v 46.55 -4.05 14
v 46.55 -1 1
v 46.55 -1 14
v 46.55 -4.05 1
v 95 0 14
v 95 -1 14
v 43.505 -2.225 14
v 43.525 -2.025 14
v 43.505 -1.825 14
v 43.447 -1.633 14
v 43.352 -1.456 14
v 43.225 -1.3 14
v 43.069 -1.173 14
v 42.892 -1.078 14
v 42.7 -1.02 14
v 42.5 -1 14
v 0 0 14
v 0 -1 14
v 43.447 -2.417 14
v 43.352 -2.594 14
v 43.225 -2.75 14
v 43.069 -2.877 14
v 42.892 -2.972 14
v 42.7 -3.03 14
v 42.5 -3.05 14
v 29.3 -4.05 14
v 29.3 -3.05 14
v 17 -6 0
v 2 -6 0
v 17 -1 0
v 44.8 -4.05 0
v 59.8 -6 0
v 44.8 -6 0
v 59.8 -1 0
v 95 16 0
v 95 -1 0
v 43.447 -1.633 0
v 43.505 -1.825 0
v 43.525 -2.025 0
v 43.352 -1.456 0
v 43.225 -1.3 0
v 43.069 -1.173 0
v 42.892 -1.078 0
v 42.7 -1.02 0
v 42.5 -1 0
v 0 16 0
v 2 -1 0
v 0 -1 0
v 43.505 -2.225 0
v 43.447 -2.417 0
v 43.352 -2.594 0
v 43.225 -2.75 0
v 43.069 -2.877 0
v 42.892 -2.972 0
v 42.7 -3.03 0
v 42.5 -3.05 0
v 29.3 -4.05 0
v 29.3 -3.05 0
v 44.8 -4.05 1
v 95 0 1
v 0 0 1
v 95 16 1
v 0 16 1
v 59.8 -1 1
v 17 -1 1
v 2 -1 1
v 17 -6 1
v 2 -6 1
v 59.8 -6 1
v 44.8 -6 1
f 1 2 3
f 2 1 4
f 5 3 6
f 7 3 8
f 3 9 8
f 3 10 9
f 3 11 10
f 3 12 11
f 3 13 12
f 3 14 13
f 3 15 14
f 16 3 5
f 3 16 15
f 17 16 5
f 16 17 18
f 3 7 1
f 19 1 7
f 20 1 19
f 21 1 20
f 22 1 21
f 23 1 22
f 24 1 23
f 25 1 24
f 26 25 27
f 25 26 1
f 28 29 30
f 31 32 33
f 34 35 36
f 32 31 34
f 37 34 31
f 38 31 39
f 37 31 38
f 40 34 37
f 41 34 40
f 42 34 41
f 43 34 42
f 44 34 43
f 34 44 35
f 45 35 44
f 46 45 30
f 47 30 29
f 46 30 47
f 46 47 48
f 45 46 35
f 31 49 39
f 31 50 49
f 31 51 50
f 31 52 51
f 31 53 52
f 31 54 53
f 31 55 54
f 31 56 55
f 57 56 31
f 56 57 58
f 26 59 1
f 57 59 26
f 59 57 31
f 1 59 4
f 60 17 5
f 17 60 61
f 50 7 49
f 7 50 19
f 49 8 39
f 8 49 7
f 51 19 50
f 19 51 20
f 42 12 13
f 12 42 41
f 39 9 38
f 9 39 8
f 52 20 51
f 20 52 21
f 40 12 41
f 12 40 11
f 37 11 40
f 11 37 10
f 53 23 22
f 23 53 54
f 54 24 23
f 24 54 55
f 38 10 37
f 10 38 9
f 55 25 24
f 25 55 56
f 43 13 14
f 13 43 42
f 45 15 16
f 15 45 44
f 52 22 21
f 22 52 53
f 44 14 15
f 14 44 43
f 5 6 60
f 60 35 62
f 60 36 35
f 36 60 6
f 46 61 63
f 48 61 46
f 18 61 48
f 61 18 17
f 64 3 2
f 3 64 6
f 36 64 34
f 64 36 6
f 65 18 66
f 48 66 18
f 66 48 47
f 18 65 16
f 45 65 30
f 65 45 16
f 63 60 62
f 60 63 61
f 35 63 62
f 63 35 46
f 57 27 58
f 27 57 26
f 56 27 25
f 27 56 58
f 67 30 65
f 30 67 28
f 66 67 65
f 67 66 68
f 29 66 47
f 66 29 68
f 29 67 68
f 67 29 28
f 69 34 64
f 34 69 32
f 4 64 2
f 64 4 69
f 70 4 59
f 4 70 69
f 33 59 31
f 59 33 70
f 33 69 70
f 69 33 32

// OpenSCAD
//////////////////////////////////////////////////////////////////////////////////////
///
///  FLEXBATTER: Flexing battery holder with built-in spring
///
///  This file generates battery holders for arbitrary cylindrical sizes.
///  The number of batteries and their size is fully parametrized.
///
///  The usual metallic spring at the minus pole is replaced by a
///  flexible printed spring, which is pressing the contacts firmly to 
///  the battery.
///
///  The contacts for the plus and minus pole can easily be made by
///  a few windings of the uninsulated ends of the connecting wires.
///  Each battery compartment contains are several holes to the outside
///  as well ad to the neighboring compartments, through which connecting
///  wires can be passed for easy configuring of parallel, serial or
///  balanced-serial battery packs.
///  
///  The preconfigured battery sizes are:
///  AA, AAA, C, D, 18650(Li-Ion), 18650P(protected Li-Ion), CR123A(16340)
///  
///  Given that the printed plastic spring needs to be flexible, ABS is the material
///  of choice here.
///
//////////////////////////////////////////////////////////////////////////////////////
///
///  2014-09-09 Heinz Spiess, Switzerland
///
///  released under Creative Commons - Attribution - Share Alike licence (CC BY-SA)
//////////////////////////////////////////////////////////////////////////////////////

// build a cube with chamfered edges
module chamfered_cube(size,d=1){
   hull(){
     translate([d,d,0])cube(size-2*[d,d,0]);
     translate([0,d,d])cube(size-2*[0,d,d]);
     translate([d,0,d])cube(size-2*[d,0,d]);
   }
}


// draw an arc width height h between radius r1..r2 and angles a1..a2
module arc(r1,r2,h,a1=0,a2=0){
     if(a2-a1<=180){
        difference(){
           cylinder(r=r2,h=h);
           translate([0,0,-1])cylinder(r=r1,h=h+2);
	   rotate(a2)translate([-r1-r2,0,-1])cube([2*(r1+r2),2*(r1+r2),h+2]);
	   rotate(a1+180)translate([-r1-r2,0,-1])cube([2*(r1+r2),2*(r1+r2),h+2]);
        }
     } else {
           difference(){
              cylinder(r=r2,h=h);
              translate([0,0,-1])cylinder(r=r1,h=h+2);
              intersection(){
	       rotate(a2)translate([-r1-r2,0,-1])cube([2*(r1+r2),2*(r1+r2),h+2]);
	       rotate(a1+180)translate([-r1-r2,0,-1])cube([2*(r1+r2),2*(r1+r2),h+2]);
	      }
           }
     }
}

/////////////////////////////////////////////////////////////////////////////////
// sline - generate a "snake line" of width w and height h 
// with a arbitrary sequence of segments defined by a radius and a turning angle
//
//   angle[i] > 0  left turn / counter-clockwise
//   angle[i] < 0  left turn / clockwise
//   angle[i] = 0  straight segment with length radius[i]
//
/////////////////////////////////////////////////////////////////////////////////
// Heinz Spiess, 2014-09-06 (CC BY-SA)
/////////////////////////////////////////////////////////////////////////////////
module sline(angle,radius,i,w,h){
   scale([angle[i]>=0?1:-1,1,1])
      assign(r=abs(radius[i]))assign(a=angle[i])
         translate([a?r:0,0,0]){
	    translate([-w/2,-r-0.01,0])cube([w,0.02,h]); // tiny overlap!
            if(a)arc(r-w/2,r+w/2,0,a,h=h);
	    else if(r>0)translate([-w/2,-r,0])cube([w,r,h]);
      if(i+1<len(angle))
           rotate(angle[i])
	      translate([a?-r:0,a?0:-r,0])
	         sline(angle,radius,i+1,w,h);
  }
}

//////////////////////////////////////////////////////////////////////////////////
//
//  FLEXBATTER:  Flexing battery holder with integrated plastic spring
//
//////////////////////////////////////////////////////////////////////////////////
module flexbatter(n=1,l=65,d=18,hf=0.75,r=4,shd=3,eps=0.28,el=0,xchan=[1/4,3/4],$fn=24){
ew=0.56;   // extrusion width
eh=0.25;   // extrusion height
w = 4*ew;  // case wall thickness
ws = 2*ew; // spring wall thickness
ch = w-ws; // edge chamfering
deepen=0; //deepening for side grip of batteries
//el = 0;  // extra length in spring
//eps = 0.28;
//shd = 3; // screw hole diameter
//hf=0.75;
//xchan=[1/4,3/4]; // relative position of traversal wire channels

r = d/5+2*ws; // linear spring length (depends on sline() call!)

   for(i=[0:n-1])translate([0,i*(d+w+ws),0]){ // generate n battery cases
      difference(){
         
         union(){
            difference(){
               // main body
               translate([0,-w-d/2,0])
	          chamfered_cube([l+w,d+2*w+(i<n-1?ws:0),hf*d+w+ch],ch);
	       // main cavity
               translate([-2,-d/2,w])cube([2+l,d,d+1]);
	       // cavity for locating plastic spring
               translate([-1,-d/2,-1])cube([2,d,d+w+2]);
	       // small cylindrical carving of walls and bottom
	       if(eps>0)translate([-1,0,d/2+w])rotate([0,90,0])cylinder(r=d/2+eps,h=l+1);
            }
      
            // plastic spring for minus pole
            for(sy=[-1,1])scale([1,sy,1])assign(D=d+2*w-2*ws-0.7){
               translate([ch,d/2+w-ws/2,0])rotate(-90)
		  //sline([90,0,120,90,120,90,0],[d/8+2,d/6,d/8-1,d/8,-d/8,d/8,d/2],0,ws,hf*d+w);
		  sline([0,180,0,180,0,-180,0,90,0],[r+ch+el,D/4,el,D/12,el/2,D/12,1+el/2,D/5,D/3],0,ws,hf*d+w);


            }
         }
      
         // lower and upper holes for contacts
         for(z=[-2*ws,2*ws])
            translate([-2*ws,-w,w-ws/2+d/2+z])cube([l+2*w+2,2*w,ws]);
      
         // longitudinal bottom wire channel
         translate([-2*ws,0,0])rotate([0,90,0])cylinder(r=w/2,h=l+w+2+r,$fn=5);
      
         // traversal bottom wire channels
         for(x=l*xchan)translate([x,-d/2-w-1,eh]) rotate([-90,0,0])cylinder(r=w/2,h=d+2*w+ws+2,$fn=6);
   
         // grip deepening
	 if(deepen>0)
            translate([w+l/2-0.5,-d/2-w-0.01,w+d+l])
	       rotate([-90,0,0]){
	          cylinder(r=l+deepen*d,h=d+2*w+2*ws+2,$fn=72);
	          if(i==0)cylinder(r1=l+deepen*d+ch,r2=l+deepen*d,h=ch+0.02,$fn=72);
	          if(i==n-1)translate([0,0,d+2*w-ch])cylinder(r2=l+deepen*d+ch,r1=l+deepen*d,h=ch+0.02,$fn=72);

               }
         // conical screw holes in corners
         for(x=[7+shd,l-2*shd])for(y=[-d/2+shd,d/2-shd])
             translate([x,y,-1]){
                cylinder(r=shd/2,h=w+2);
                translate([0,0,w-shd/2+1])cylinder(r1=shd/2,r2=shd,h=shd/2+0.01);
             }

         // holes for wires passing inside
         for(sy=[-1,1])scale([1,sy,1]){
	    translate([l-1,-d/2,w])cube([w+2,2,2]);
            for(x=[3,l-7])translate([x,-d/2-w-ws-1,w])cube([3,w+ws+3,2]); 
            translate([3,-d/2+w/2-0.75,-1])cube([3,1.5,w+2]); 
            translate([-0.5,-d/2+w/2,0])rotate([0,90,0])cylinder(r=w/2,h=6.5,$fn=5);
         }

         // engrave battery symbol
	 translate([w+l/2,d/4+1,w])cube([l/5,d/4.5,4*eh],true);
	 translate([w+l/2+l/10,d/4+1,w])cube([d/7,d/10,4*eh],true);
	 // engrave plus symbol
	 assign(sy=(l>12*shd)?1:-1){ // for short batteries +- on the side
	    translate([w+l/2+l/(sy>0?5:10),sy*(d/4+1),w]){
	       cube([1,d/4,4*eh],true);
	       cube([d/4,1,4*eh],true);
            }
	 // engrave minus symbol
	    translate([w+l/2-l/(sy>0?5:10),sy*(d/4+1),w])
	       cube([1,d/4,4*eh],true);
         }
   
         //correction for middle separators
         //if(i<n-1) translate([-d,d/2+w-ws/2,-1])cube([d,ws/2+0.1,d+2]);
	 //else translate([1,d/2+w,-0.01])cylinder(r1=ch,r2=0,h=ch);
         //if(i>0) translate([-d,-d/2-w-0.1,-1])cube([d,ws/2+0.1,d+2]);
	 //else translate([1,-d/2-w,-0.01])cylinder(r1=ch,r2=0,h=ch);


      }


      // horizontal contact bulges (+ and - pole)
      for(x=[-0.3,l])
         hull()for(y=[-3+el,3-el])
            translate([x,y,w+d/2])sphere(r=ws);
   
      // vertical contact bulge (+ pole only)
      if(0)hull()for(z=[-3+el,3-el])for(x=[0,w-ws])
            translate([l+x,0,w+d/2+z])sphere(r=ws);



   }

}

module flexbatter18650(n=1){
   flexbatter(n=n,l=65.5,d=18.4,hf=0.75,shd=3,eps=0.28);
}  

module flexbatter18650P(n=1){
   flexbatter(n=n,l=67.5,d=18.4,hf=0.75,shd=3,eps=0.28);
}  

module flexbatterCR123A(n=1){
   flexbatter(n=n,l=35.1,d=16.7,hf=0.75,shd=3,xchan=[0.5],eps=0.28);
}  

module flexbatterD(n=1){
   flexbatter(n=n,l=61.5,d=34.0,hf=0.75,shd=3,eps=0.28);
}  

module flexbatterC(n=1){
   flexbatter(n=n,l=51.6,d=26.4,hf=0.75,shd=3,eps=0.28);
}  

module flexbatterAA(n=1){
   flexbatter(n=n,l=51.6,d=14.4,hf=0.80,shd=2.5,el=0.5,eps=0.28);
}  

module flexbatterAAA(n=1){
   flexbatter(n=n,l=46.1,d=10.45,hf=0.84,shd=2,el=1,xchan=[0.5],eps=0);
}  

module flexbatter18650x1(){ // AUTO_MAKE_STL
  flexbatter18650(n=1);
}

module flexbatter18650Px1(){ // AUTO_MAKE_STL
  flexbatter18650P(n=1);
}

module flexbatterCR123Ax1(){ // AUTO_MAKE_STL
  flexbatterCR123A(n=1);
}

module flexbatterAAx1(){ // AUTO_MAKE_STL
  flexbatterAA(n=1);
}

module flexbatterAAAx1(){ // AUTO_MAKE_STL
  flexbatterAAA(n=1);
}

module flexbatterCx1(){ // AUTO_MAKE_STL
  flexbatterC(n=1);
}

module flexbatter18650x2(){ // AUTO_MAKE_STL
  flexbatter18650(n=2);
}

module flexbatterAAx2(){ // AUTO_MAKE_STL
  flexbatterAA(n=2);
}

module flexbatterAAAx2(){ // AUTO_MAKE_STL
  flexbatterAAA(n=2);
}

module flexbatterCx2(){ // AUTO_MAKE_STL
  flexbatterC(n=2);
}

module flexbatter18650x3(){ // AUTO_MAKE_STL
  flexbatter18650(n=3);
}

module flexbatterAAx3(){ // AUTO_MAKE_STL
  flexbatterAA(n=3);
}

module flexbatterAAAx3(){ // AUTO_MAKE_STL
  flexbatterAAA(n=3);
}

module flexbatter18650x4(){ // AUTO_MAKE_STL
  flexbatter18650(n=4);
}

module flexbatterAAx4(){ // AUTO_MAKE_STL
  flexbatterAA(n=4);
}

module flexbatterAAAx4(){ // AUTO_MAKE_STL
  flexbatterAAA(n=4);
}

module rackhook(){
  raillen=75;
  xtraraillen=20;
  railh=14;
  railth=1;
  restde=16;
  pegw=11;
  pegth=1.95;//1.8
  flapw=30;
  flaph=14;
  flapth=railth;
  hookth=flapth;
  hookw=pegw*1.2;
  hookgap=pegth+0.1;
  spineth=flapth+hookgap+hookth;
  xofs=-10;


	//rail
	cube([raillen+xtraraillen,railth,railh]);
  //extrarail front
	//rest
	translate([0,-restde,0]) cube([raillen+xtraraillen,restde,1]);
  //outer plate
  translate([(raillen/2-flapw/2),0,0]) cube([flapw,flapth,flaph]);
  //hook
  translate([(raillen/2-flapw/2)+flapw-hookw+xofs,flapth+hookgap,0]) cube([hookw,flapth,flaph]);

	difference(){
	   union(){		
		  //spine of hook 
		  translate([(raillen/2+flapw/2)+xofs,0,0]) cube([spineth,spineth,flaph]);
	   }//union
	 //rounder of spine
	 translate([(raillen/2+flapw/2)+xofs,railth+hookgap/2,-0.05]) cylinder(d=hookgap,h=flaph+0.1,$fn=32);
  }//difference
  //inflaps 
  flapofs1=2;  
  flapofs2=hookw+2;
  flaplen=raillen*0.2;
  flapde=5;//restde*0.4;
	translate([flapofs1,railth,0]) cube([flaplen,flapde,railth]);
	translate([raillen-flapofs2-flaplen,railth,0]) cube([flaplen,flapde,railth]);
}
//rackhook();
mirror ([0,1,0]) rackhook();

// uncomment as needed:

//flexbatterCR123A(n=2);
//rotate([0,0,0])translate([0,0,-9])flexbatter18650(n=1);
//translate([0,40,0])rotate([90,0,0])translate([0,0,-9])flexbatter18650(n=1);
//translate([0,80,0])rotate([180,0,0])translate([0,0,-9])flexbatter18650(n=1);
//translate([0,120,0])rotate([-90,0,0])translate([0,0,-9])flexbatter18650(n=1);
//translate([0,33,0])flexbatter18650(n=2);
//translate([0,90,0])flexbatter18650(n=3);
//translate([-90,33,0])flexbatter18650(n=4);
//translate([0,28,0])flexbatterAA(n=2);
//translate([0,50,0])flexbatterAAA(n=1);
//flexbatterC(n=1);
//flexbatterD(n=1);
